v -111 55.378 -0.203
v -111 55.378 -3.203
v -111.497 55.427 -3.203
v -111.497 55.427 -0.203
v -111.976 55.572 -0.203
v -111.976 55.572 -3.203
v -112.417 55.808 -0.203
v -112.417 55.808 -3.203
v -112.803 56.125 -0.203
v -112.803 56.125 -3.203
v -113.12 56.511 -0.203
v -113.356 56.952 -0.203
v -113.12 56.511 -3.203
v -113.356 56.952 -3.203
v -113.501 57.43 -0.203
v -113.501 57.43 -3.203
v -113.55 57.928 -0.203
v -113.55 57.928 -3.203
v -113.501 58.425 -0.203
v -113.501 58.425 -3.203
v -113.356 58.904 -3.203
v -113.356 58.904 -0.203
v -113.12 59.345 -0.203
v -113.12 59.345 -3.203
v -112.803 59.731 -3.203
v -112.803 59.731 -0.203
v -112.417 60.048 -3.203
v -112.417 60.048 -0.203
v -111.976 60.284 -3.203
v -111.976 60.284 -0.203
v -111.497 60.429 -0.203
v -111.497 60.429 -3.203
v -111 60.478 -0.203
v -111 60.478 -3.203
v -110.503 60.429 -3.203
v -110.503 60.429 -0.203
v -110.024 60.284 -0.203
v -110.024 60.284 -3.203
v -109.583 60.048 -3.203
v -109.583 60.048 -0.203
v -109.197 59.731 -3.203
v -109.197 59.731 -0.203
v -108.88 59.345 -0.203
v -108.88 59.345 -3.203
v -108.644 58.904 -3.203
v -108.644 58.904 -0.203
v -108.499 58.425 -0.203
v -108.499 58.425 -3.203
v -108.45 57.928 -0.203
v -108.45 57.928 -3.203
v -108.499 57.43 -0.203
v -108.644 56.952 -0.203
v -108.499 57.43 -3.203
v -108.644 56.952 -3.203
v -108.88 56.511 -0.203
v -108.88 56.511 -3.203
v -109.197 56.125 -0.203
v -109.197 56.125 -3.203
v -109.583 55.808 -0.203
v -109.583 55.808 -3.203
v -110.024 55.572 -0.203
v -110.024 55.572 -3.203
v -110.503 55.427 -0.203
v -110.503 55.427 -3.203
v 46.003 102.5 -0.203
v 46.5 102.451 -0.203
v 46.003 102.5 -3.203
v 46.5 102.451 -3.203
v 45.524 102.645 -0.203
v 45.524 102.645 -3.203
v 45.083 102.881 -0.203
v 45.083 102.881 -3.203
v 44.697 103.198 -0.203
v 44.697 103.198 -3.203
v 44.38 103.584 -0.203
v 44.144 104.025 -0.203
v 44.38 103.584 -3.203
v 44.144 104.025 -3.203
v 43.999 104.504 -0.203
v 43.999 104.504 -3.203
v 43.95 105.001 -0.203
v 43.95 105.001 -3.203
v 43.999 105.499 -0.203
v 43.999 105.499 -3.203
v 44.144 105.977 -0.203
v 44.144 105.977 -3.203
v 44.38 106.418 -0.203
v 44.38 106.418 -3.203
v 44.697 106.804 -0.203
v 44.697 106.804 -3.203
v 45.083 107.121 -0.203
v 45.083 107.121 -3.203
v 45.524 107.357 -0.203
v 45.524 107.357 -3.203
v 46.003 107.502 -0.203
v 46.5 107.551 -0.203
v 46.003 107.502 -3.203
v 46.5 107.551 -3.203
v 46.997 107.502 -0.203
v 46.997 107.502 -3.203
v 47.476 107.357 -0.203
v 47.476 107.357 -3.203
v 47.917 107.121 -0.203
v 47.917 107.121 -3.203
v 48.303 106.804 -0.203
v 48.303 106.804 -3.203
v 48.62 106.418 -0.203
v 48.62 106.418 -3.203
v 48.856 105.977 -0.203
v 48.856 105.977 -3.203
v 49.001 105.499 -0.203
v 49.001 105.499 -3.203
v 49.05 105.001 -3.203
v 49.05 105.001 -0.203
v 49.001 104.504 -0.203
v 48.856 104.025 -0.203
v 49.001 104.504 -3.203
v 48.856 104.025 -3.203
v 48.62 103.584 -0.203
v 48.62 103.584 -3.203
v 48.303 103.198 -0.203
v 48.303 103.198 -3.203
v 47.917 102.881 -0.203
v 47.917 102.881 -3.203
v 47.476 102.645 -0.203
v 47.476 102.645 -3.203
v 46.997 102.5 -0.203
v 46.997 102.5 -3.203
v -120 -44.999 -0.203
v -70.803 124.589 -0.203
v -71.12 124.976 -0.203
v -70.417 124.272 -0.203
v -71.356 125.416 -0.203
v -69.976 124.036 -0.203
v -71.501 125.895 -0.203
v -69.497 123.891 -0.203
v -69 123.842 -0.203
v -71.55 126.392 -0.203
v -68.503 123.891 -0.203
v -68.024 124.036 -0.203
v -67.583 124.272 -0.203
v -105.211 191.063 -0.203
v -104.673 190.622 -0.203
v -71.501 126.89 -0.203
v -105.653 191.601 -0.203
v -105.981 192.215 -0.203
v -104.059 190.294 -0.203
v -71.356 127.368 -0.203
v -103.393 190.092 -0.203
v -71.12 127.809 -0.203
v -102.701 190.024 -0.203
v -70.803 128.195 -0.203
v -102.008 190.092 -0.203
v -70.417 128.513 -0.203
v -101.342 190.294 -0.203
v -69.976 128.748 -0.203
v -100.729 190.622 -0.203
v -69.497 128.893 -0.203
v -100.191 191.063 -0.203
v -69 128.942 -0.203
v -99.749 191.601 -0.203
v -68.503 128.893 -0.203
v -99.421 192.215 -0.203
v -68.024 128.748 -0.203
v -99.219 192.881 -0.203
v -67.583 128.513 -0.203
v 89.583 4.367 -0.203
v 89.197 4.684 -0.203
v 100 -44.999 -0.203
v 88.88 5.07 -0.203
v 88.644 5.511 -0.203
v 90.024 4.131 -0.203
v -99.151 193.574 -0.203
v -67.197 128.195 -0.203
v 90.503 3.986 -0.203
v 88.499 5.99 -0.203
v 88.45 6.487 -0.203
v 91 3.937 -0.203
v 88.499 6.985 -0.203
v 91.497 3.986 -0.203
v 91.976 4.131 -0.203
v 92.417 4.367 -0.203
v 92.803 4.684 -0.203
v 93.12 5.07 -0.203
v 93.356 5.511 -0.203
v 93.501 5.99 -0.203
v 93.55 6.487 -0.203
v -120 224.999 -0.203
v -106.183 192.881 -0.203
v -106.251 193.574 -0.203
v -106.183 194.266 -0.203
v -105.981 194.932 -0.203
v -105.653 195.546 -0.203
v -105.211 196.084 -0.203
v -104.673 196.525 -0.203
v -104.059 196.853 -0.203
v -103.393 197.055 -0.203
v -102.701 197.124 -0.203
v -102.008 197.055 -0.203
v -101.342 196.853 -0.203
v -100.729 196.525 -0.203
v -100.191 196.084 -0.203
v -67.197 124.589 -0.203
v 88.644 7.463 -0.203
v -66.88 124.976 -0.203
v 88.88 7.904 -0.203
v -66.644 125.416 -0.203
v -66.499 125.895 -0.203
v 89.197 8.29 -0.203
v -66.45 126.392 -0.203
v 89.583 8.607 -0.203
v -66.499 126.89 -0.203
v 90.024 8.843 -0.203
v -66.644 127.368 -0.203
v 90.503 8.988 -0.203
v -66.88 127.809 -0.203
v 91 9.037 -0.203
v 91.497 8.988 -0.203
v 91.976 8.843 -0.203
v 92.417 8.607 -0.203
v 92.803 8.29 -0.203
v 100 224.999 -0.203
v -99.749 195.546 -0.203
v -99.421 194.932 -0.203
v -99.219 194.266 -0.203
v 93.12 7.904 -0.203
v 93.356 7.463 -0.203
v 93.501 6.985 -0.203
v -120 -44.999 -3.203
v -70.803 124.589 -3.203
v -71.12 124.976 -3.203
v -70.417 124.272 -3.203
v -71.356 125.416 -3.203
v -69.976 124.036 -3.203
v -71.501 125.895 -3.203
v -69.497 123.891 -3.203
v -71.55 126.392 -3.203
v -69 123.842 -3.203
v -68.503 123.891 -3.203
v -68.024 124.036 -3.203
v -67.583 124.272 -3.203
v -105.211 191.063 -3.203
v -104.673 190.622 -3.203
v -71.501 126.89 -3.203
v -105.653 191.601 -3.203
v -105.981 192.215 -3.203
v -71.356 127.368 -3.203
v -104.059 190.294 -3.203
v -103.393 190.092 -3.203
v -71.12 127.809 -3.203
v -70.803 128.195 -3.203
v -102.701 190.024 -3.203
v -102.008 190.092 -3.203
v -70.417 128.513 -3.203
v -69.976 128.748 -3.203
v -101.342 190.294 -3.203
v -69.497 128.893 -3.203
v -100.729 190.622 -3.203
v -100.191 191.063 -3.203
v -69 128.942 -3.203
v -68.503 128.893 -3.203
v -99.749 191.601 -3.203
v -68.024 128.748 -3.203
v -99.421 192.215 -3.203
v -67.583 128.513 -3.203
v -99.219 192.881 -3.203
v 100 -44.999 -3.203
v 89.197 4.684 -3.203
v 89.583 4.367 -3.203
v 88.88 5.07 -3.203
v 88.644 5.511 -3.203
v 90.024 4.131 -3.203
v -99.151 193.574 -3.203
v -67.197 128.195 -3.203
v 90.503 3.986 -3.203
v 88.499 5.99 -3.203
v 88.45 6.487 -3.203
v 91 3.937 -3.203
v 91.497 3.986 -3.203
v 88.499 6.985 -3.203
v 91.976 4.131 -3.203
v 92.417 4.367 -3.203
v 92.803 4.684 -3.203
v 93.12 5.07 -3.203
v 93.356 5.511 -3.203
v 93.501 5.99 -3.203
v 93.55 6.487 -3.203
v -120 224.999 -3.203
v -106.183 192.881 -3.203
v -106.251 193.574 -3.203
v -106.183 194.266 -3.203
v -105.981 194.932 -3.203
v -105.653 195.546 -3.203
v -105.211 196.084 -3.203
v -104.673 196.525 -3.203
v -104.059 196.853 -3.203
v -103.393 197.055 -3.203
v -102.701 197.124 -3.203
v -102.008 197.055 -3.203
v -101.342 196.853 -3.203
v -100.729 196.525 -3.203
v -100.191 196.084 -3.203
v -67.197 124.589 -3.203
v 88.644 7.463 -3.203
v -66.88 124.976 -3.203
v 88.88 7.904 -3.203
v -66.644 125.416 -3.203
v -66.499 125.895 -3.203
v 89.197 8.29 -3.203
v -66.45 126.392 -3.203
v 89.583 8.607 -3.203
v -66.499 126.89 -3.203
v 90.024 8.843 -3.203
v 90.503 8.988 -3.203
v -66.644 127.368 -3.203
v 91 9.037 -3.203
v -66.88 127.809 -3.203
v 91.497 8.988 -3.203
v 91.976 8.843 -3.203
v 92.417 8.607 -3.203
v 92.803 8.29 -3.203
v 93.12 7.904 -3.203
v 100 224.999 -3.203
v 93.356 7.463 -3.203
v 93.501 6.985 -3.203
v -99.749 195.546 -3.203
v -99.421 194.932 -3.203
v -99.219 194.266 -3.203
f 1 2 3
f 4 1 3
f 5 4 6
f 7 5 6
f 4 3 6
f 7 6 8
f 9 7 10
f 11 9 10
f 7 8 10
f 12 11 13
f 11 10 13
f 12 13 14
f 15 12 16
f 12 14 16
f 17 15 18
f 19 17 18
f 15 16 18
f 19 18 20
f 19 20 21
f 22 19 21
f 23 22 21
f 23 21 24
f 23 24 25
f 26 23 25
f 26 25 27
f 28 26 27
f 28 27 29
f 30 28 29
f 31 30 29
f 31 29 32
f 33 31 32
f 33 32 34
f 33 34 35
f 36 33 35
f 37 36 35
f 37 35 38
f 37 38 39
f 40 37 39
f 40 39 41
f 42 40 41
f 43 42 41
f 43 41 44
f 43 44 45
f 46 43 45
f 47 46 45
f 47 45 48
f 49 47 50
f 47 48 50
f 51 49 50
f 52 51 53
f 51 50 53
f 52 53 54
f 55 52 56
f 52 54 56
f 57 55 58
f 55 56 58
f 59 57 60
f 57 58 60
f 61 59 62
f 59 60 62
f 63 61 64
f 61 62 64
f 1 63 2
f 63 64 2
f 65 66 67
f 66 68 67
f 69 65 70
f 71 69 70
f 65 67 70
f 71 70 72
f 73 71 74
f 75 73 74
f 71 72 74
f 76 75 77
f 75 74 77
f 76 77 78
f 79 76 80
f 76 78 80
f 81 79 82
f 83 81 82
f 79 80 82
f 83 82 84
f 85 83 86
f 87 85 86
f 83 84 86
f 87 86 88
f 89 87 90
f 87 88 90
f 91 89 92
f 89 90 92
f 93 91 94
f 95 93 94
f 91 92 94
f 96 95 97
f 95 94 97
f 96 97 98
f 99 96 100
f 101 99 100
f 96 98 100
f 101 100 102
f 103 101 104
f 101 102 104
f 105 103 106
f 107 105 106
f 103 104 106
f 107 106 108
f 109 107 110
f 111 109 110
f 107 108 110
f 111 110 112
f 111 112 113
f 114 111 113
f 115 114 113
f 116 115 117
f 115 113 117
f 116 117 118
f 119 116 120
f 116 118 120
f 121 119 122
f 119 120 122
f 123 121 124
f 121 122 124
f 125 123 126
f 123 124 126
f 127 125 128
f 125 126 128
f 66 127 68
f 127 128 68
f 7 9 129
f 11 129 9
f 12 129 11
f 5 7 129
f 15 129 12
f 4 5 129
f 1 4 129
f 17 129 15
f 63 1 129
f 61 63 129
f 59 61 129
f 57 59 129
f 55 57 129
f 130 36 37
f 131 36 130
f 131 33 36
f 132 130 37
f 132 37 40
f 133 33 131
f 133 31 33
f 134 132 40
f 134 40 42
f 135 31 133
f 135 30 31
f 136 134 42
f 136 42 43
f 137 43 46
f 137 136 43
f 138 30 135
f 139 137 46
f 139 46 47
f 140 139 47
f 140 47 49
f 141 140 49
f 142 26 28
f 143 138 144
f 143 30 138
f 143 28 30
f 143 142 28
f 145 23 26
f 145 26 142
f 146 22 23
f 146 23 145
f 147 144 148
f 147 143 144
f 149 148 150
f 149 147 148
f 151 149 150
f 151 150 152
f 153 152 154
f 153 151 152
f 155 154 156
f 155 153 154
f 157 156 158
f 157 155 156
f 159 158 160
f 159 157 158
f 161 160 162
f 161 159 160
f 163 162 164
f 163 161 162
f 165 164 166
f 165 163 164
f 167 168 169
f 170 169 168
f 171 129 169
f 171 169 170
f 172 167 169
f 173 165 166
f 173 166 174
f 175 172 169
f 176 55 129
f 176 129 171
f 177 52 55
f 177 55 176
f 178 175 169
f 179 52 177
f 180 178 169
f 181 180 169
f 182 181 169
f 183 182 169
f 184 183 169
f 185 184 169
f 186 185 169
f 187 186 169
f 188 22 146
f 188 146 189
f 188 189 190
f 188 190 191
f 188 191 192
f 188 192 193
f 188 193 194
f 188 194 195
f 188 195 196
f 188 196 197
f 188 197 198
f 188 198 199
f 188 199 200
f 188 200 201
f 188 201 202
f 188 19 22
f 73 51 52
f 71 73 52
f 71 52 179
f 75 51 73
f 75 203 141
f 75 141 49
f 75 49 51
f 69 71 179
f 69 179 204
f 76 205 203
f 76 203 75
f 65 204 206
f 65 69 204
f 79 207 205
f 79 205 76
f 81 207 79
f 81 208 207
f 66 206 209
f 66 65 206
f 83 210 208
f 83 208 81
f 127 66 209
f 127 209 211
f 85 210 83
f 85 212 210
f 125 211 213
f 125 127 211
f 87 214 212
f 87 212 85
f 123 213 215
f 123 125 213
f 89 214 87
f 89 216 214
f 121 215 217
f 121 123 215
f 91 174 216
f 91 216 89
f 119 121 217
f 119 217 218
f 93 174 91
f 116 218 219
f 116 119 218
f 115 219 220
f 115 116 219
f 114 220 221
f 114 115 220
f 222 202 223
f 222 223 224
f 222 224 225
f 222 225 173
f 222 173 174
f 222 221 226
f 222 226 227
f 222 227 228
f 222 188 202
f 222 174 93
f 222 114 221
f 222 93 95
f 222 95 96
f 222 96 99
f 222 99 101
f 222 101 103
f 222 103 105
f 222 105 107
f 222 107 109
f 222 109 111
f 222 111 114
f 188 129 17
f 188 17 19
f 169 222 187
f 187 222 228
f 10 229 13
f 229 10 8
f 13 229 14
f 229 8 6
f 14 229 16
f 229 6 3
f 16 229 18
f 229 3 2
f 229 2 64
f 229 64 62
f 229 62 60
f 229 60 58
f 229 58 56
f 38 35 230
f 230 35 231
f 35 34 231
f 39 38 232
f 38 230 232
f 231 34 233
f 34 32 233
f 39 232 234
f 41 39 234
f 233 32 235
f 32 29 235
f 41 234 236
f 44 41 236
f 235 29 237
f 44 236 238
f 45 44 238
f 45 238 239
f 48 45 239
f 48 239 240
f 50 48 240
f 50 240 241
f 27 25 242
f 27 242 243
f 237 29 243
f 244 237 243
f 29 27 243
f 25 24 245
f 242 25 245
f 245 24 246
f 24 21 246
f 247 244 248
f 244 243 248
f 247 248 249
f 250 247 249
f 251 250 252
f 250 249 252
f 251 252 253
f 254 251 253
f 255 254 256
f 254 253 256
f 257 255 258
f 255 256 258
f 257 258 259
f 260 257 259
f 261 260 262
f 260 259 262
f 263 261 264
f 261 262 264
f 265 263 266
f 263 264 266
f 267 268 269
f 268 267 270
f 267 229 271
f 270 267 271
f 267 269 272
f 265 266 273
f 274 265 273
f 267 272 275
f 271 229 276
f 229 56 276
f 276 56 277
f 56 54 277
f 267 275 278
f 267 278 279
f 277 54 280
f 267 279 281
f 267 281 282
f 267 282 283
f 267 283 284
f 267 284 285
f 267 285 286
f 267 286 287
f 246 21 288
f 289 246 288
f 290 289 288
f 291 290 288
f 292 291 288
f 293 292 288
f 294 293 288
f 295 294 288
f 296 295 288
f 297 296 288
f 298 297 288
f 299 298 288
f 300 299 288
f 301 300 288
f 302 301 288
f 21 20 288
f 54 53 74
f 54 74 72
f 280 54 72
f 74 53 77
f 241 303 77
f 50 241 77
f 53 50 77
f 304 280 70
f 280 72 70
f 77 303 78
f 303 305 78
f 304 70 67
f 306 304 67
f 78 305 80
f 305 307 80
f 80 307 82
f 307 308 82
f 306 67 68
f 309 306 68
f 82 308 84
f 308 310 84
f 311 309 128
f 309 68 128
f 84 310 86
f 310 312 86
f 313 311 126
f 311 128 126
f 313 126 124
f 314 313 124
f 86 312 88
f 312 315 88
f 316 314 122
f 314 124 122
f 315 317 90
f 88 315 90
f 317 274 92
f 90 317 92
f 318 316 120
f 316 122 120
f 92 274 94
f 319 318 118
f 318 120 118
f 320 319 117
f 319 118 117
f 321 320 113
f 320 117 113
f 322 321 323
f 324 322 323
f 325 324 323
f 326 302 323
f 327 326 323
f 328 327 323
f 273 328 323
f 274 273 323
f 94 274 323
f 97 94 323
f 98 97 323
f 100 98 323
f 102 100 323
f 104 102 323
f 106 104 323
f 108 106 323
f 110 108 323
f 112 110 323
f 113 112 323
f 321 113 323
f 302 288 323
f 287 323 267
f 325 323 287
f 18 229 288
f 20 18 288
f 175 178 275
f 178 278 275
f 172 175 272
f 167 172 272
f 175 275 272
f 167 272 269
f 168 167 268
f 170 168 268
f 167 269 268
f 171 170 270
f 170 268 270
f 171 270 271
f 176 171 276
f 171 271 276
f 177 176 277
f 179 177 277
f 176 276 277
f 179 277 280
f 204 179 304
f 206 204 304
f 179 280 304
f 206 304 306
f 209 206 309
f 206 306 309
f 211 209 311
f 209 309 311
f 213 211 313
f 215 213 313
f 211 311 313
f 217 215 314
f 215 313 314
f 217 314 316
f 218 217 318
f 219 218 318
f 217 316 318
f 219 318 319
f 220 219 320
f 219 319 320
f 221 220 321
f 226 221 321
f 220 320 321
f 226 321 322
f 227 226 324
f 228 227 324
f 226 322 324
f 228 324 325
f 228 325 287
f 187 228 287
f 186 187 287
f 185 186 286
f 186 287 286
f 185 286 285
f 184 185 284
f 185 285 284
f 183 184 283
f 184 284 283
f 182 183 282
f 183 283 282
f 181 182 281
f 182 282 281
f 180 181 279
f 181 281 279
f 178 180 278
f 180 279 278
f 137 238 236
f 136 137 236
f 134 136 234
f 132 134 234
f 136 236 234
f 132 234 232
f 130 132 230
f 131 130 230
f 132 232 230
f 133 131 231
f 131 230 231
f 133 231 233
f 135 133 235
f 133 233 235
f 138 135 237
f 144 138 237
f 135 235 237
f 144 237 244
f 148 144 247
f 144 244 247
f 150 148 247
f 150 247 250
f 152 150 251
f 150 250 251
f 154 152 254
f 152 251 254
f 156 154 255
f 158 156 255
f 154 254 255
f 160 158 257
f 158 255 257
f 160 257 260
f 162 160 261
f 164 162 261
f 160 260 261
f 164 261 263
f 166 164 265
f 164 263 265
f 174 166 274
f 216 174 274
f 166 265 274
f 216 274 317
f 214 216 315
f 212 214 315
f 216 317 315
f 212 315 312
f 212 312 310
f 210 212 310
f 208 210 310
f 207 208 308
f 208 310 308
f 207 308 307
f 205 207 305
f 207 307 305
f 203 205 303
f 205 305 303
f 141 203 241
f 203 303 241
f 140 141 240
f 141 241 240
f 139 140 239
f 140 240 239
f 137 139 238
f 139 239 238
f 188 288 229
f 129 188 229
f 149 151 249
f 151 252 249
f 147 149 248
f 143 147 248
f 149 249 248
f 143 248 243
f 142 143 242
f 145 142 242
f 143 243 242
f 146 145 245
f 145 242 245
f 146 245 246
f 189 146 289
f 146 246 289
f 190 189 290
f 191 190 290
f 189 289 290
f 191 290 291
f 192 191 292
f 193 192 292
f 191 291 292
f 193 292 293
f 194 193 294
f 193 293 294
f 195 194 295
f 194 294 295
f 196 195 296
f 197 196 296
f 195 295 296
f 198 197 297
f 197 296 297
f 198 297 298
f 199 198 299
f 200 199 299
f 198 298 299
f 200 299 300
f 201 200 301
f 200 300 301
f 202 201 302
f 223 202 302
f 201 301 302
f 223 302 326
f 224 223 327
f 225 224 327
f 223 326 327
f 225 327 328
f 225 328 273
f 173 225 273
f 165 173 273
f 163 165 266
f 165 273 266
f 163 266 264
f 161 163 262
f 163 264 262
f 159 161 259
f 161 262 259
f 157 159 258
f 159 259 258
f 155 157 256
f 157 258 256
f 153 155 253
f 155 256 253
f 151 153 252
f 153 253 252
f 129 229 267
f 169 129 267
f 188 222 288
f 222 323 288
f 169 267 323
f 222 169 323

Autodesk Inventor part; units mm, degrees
ref_plane "YZ Plane" through (0, 0, 0) normal (1, 0, 0) x (0, 1, 0)
ref_plane "XZ Plane" through (0, 0, 0) normal (0, 1, 0) x (-1, 0, 0)
ref_plane "XY Plane" through (0, 0, 0) normal (0, 0, 1) x (1, 0, 0)
ref_plane "Work Plane1" through (-9, 0, -3.2032) normal (0, 0, 1) x (1, 0, 0)
sketch "Sketch1" plane through (-9, 0, -3.2032) normal (0, 0, 1) x (1, 0, 0)
  ellipse E0 centre (-38.5, 0) end of major axis (-36.433, 0) minor radius 2.0669 projected
  ellipse E1 centre (36.5, 0) end of major axis (38.567, 0) minor radius 2.0669 projected
  line L0 (89, -44.9989) -> (89, 224.9989)
  line L1 (-111, 224.9989) -> (-111, -44.9989)
  line L2 (-111, -44.9989) -> (89, -44.9989)
  line L3 (89, 224.9989) -> (-91, 224.9989) projected
  line L4 (-91, -24.9989) -> (-91, 224.9989) projected
  line L5 (-91, -24.9989) -> (89, -24.9989) projected
  line L6 (89, 224.9989) -> (89, -24.9989) projected
  line L7 (-91, 224.9989) -> (-111, 224.9989)
  line L8 (89, -44.9989) -> (109, -44.9989)
  line L9 (109, -44.9989) -> (109, 224.9989)
  line L10 (109, 224.9989) -> (89, 224.9989)
  line L11 (89, 224.9989) -> (-91, 224.9989)
  point P0 (9, 0)
  point P1 (79, 224.9989)
  point P2 (79, -24.9989)
  point P3 (-81, 224.9989)
  point P4 (-81, -24.9989)
  point P5 (-91, 1846.3654)
  dimension "d40" = 20
  dimension "d41" = 90
extrude "Extrusion1" add sketch "Sketch1" along normal blind 3 contours E0 | E1 | L2 L1 L7 L4 L5 L0 | L0 L10 L9 L8 | L5 L4 L3 L0
sketch "Sketch2" plane through (-9, 0, -0.2032) normal (0, 0, 1) x (1, 0, 0)
  line L0 (-111, -44.9989) -> (89, -44.9989) construction
  line L1 (55.5, -44.9989) -> (55.5, 235.0161) construction
  line L2 (89, -44.9989) -> (89, 224.9989) construction
  line L3 (88.5, -24.9989) -> (88.5, 475.0011) projected
  point P0 (9, 0)
  point P1 (89, 4927.5367)
  point P2 (55.5, 105.0011)
  dimension "d4" = 33
  dimension "d12" = 150
hole "Hole1" at (46.5, 105.0011, -0.2032) direction (0, 0, -1) diameter 5.1 depth 3
sketch "Sketch3" plane through (-9, 0, -0.2032) normal (0, 0, 1) x (1, 0, 0)
  line L0 (89, -24.9989) -> (89, -24.9989) projected
  line L1 (89, -24.9989) -> (89, 475.0011) projected
  line L2 (89, 475.0011) -> (89, 475.0011) projected
  line L3 (89, -24.9989) -> (89, 475.0011) projected
  line L4 (69, -24.9989) -> (69, -24.9989) projected
  line L5 (69, -24.9989) -> (69, 475.0011) projected
  line L6 (69, 475.0011) -> (69, 475.0011) projected
  line L7 (69, -24.9989) -> (69, 475.0011) projected
  line L8 (-91, -24.9989) -> (-91, -24.9989) projected
  line L9 (-91, -24.9989) -> (-91, 475.0011) projected
  line L10 (-91, 475.0011) -> (-91, 475.0011) projected
  line L11 (-91, -24.9989) -> (-91, 475.0011) projected
  line L12 (-71, -24.9989) -> (-71, -24.9989) projected
  line L13 (-71, -24.9989) -> (-71, 475.0011) projected
  line L14 (-71, 475.0011) -> (-71, 475.0011) projected
  line L15 (-71, -24.9989) -> (-71, 475.0011) projected
  line L16 (100, -24.9989) -> (100, 239.9989) construction
  line L17 (-102, -24.9989) -> (-102, 244.9989) construction
  line L18 (-60, -24.9989) -> (-60, 2205.8354) construction
  line L19 (98.966, 4926.9545) -> (-101.034, 1503.4308) construction
  line L20 (55.3, -24.9989) -> (55.3, 4179.4968) construction
  line L21 (89, -44.9989) -> (89, 224.9989) projected
  point P0 (9, 0)
  point P1 (89, 4927.5367)
  point P2 (-111, 1504.013)
  point P3 (100, 6.4871)
  point P4 (-60, 126.3923)
  point P5 (-102, 57.9278)
  point P6 (-102, 193.5737)
  dimension "d14" = 11
  dimension "d15" = 11
  dimension "d16" = 13.7
  dimension "d39" = 11
hole "Hole3" at (91, 6.4871, -0.2032) at (-69, 126.3923, -0.2032) at (-111, 57.9278, -0.2032) direction (0, 0, -1) diameter 5.1 depth 3
sketch "Sketch4" plane through (-9, 0, -0.2032) normal (0, 0, 1) x (1, 0, 0)
  point P0 (9, 0)
  point P1 (-93.7009, 193.5736)
hole "Hole4" at (-102.7009, 193.5736, -0.2032) direction (0, 0, -1) diameter 7.1 depth 3
properties part number "Z axis front plate"
